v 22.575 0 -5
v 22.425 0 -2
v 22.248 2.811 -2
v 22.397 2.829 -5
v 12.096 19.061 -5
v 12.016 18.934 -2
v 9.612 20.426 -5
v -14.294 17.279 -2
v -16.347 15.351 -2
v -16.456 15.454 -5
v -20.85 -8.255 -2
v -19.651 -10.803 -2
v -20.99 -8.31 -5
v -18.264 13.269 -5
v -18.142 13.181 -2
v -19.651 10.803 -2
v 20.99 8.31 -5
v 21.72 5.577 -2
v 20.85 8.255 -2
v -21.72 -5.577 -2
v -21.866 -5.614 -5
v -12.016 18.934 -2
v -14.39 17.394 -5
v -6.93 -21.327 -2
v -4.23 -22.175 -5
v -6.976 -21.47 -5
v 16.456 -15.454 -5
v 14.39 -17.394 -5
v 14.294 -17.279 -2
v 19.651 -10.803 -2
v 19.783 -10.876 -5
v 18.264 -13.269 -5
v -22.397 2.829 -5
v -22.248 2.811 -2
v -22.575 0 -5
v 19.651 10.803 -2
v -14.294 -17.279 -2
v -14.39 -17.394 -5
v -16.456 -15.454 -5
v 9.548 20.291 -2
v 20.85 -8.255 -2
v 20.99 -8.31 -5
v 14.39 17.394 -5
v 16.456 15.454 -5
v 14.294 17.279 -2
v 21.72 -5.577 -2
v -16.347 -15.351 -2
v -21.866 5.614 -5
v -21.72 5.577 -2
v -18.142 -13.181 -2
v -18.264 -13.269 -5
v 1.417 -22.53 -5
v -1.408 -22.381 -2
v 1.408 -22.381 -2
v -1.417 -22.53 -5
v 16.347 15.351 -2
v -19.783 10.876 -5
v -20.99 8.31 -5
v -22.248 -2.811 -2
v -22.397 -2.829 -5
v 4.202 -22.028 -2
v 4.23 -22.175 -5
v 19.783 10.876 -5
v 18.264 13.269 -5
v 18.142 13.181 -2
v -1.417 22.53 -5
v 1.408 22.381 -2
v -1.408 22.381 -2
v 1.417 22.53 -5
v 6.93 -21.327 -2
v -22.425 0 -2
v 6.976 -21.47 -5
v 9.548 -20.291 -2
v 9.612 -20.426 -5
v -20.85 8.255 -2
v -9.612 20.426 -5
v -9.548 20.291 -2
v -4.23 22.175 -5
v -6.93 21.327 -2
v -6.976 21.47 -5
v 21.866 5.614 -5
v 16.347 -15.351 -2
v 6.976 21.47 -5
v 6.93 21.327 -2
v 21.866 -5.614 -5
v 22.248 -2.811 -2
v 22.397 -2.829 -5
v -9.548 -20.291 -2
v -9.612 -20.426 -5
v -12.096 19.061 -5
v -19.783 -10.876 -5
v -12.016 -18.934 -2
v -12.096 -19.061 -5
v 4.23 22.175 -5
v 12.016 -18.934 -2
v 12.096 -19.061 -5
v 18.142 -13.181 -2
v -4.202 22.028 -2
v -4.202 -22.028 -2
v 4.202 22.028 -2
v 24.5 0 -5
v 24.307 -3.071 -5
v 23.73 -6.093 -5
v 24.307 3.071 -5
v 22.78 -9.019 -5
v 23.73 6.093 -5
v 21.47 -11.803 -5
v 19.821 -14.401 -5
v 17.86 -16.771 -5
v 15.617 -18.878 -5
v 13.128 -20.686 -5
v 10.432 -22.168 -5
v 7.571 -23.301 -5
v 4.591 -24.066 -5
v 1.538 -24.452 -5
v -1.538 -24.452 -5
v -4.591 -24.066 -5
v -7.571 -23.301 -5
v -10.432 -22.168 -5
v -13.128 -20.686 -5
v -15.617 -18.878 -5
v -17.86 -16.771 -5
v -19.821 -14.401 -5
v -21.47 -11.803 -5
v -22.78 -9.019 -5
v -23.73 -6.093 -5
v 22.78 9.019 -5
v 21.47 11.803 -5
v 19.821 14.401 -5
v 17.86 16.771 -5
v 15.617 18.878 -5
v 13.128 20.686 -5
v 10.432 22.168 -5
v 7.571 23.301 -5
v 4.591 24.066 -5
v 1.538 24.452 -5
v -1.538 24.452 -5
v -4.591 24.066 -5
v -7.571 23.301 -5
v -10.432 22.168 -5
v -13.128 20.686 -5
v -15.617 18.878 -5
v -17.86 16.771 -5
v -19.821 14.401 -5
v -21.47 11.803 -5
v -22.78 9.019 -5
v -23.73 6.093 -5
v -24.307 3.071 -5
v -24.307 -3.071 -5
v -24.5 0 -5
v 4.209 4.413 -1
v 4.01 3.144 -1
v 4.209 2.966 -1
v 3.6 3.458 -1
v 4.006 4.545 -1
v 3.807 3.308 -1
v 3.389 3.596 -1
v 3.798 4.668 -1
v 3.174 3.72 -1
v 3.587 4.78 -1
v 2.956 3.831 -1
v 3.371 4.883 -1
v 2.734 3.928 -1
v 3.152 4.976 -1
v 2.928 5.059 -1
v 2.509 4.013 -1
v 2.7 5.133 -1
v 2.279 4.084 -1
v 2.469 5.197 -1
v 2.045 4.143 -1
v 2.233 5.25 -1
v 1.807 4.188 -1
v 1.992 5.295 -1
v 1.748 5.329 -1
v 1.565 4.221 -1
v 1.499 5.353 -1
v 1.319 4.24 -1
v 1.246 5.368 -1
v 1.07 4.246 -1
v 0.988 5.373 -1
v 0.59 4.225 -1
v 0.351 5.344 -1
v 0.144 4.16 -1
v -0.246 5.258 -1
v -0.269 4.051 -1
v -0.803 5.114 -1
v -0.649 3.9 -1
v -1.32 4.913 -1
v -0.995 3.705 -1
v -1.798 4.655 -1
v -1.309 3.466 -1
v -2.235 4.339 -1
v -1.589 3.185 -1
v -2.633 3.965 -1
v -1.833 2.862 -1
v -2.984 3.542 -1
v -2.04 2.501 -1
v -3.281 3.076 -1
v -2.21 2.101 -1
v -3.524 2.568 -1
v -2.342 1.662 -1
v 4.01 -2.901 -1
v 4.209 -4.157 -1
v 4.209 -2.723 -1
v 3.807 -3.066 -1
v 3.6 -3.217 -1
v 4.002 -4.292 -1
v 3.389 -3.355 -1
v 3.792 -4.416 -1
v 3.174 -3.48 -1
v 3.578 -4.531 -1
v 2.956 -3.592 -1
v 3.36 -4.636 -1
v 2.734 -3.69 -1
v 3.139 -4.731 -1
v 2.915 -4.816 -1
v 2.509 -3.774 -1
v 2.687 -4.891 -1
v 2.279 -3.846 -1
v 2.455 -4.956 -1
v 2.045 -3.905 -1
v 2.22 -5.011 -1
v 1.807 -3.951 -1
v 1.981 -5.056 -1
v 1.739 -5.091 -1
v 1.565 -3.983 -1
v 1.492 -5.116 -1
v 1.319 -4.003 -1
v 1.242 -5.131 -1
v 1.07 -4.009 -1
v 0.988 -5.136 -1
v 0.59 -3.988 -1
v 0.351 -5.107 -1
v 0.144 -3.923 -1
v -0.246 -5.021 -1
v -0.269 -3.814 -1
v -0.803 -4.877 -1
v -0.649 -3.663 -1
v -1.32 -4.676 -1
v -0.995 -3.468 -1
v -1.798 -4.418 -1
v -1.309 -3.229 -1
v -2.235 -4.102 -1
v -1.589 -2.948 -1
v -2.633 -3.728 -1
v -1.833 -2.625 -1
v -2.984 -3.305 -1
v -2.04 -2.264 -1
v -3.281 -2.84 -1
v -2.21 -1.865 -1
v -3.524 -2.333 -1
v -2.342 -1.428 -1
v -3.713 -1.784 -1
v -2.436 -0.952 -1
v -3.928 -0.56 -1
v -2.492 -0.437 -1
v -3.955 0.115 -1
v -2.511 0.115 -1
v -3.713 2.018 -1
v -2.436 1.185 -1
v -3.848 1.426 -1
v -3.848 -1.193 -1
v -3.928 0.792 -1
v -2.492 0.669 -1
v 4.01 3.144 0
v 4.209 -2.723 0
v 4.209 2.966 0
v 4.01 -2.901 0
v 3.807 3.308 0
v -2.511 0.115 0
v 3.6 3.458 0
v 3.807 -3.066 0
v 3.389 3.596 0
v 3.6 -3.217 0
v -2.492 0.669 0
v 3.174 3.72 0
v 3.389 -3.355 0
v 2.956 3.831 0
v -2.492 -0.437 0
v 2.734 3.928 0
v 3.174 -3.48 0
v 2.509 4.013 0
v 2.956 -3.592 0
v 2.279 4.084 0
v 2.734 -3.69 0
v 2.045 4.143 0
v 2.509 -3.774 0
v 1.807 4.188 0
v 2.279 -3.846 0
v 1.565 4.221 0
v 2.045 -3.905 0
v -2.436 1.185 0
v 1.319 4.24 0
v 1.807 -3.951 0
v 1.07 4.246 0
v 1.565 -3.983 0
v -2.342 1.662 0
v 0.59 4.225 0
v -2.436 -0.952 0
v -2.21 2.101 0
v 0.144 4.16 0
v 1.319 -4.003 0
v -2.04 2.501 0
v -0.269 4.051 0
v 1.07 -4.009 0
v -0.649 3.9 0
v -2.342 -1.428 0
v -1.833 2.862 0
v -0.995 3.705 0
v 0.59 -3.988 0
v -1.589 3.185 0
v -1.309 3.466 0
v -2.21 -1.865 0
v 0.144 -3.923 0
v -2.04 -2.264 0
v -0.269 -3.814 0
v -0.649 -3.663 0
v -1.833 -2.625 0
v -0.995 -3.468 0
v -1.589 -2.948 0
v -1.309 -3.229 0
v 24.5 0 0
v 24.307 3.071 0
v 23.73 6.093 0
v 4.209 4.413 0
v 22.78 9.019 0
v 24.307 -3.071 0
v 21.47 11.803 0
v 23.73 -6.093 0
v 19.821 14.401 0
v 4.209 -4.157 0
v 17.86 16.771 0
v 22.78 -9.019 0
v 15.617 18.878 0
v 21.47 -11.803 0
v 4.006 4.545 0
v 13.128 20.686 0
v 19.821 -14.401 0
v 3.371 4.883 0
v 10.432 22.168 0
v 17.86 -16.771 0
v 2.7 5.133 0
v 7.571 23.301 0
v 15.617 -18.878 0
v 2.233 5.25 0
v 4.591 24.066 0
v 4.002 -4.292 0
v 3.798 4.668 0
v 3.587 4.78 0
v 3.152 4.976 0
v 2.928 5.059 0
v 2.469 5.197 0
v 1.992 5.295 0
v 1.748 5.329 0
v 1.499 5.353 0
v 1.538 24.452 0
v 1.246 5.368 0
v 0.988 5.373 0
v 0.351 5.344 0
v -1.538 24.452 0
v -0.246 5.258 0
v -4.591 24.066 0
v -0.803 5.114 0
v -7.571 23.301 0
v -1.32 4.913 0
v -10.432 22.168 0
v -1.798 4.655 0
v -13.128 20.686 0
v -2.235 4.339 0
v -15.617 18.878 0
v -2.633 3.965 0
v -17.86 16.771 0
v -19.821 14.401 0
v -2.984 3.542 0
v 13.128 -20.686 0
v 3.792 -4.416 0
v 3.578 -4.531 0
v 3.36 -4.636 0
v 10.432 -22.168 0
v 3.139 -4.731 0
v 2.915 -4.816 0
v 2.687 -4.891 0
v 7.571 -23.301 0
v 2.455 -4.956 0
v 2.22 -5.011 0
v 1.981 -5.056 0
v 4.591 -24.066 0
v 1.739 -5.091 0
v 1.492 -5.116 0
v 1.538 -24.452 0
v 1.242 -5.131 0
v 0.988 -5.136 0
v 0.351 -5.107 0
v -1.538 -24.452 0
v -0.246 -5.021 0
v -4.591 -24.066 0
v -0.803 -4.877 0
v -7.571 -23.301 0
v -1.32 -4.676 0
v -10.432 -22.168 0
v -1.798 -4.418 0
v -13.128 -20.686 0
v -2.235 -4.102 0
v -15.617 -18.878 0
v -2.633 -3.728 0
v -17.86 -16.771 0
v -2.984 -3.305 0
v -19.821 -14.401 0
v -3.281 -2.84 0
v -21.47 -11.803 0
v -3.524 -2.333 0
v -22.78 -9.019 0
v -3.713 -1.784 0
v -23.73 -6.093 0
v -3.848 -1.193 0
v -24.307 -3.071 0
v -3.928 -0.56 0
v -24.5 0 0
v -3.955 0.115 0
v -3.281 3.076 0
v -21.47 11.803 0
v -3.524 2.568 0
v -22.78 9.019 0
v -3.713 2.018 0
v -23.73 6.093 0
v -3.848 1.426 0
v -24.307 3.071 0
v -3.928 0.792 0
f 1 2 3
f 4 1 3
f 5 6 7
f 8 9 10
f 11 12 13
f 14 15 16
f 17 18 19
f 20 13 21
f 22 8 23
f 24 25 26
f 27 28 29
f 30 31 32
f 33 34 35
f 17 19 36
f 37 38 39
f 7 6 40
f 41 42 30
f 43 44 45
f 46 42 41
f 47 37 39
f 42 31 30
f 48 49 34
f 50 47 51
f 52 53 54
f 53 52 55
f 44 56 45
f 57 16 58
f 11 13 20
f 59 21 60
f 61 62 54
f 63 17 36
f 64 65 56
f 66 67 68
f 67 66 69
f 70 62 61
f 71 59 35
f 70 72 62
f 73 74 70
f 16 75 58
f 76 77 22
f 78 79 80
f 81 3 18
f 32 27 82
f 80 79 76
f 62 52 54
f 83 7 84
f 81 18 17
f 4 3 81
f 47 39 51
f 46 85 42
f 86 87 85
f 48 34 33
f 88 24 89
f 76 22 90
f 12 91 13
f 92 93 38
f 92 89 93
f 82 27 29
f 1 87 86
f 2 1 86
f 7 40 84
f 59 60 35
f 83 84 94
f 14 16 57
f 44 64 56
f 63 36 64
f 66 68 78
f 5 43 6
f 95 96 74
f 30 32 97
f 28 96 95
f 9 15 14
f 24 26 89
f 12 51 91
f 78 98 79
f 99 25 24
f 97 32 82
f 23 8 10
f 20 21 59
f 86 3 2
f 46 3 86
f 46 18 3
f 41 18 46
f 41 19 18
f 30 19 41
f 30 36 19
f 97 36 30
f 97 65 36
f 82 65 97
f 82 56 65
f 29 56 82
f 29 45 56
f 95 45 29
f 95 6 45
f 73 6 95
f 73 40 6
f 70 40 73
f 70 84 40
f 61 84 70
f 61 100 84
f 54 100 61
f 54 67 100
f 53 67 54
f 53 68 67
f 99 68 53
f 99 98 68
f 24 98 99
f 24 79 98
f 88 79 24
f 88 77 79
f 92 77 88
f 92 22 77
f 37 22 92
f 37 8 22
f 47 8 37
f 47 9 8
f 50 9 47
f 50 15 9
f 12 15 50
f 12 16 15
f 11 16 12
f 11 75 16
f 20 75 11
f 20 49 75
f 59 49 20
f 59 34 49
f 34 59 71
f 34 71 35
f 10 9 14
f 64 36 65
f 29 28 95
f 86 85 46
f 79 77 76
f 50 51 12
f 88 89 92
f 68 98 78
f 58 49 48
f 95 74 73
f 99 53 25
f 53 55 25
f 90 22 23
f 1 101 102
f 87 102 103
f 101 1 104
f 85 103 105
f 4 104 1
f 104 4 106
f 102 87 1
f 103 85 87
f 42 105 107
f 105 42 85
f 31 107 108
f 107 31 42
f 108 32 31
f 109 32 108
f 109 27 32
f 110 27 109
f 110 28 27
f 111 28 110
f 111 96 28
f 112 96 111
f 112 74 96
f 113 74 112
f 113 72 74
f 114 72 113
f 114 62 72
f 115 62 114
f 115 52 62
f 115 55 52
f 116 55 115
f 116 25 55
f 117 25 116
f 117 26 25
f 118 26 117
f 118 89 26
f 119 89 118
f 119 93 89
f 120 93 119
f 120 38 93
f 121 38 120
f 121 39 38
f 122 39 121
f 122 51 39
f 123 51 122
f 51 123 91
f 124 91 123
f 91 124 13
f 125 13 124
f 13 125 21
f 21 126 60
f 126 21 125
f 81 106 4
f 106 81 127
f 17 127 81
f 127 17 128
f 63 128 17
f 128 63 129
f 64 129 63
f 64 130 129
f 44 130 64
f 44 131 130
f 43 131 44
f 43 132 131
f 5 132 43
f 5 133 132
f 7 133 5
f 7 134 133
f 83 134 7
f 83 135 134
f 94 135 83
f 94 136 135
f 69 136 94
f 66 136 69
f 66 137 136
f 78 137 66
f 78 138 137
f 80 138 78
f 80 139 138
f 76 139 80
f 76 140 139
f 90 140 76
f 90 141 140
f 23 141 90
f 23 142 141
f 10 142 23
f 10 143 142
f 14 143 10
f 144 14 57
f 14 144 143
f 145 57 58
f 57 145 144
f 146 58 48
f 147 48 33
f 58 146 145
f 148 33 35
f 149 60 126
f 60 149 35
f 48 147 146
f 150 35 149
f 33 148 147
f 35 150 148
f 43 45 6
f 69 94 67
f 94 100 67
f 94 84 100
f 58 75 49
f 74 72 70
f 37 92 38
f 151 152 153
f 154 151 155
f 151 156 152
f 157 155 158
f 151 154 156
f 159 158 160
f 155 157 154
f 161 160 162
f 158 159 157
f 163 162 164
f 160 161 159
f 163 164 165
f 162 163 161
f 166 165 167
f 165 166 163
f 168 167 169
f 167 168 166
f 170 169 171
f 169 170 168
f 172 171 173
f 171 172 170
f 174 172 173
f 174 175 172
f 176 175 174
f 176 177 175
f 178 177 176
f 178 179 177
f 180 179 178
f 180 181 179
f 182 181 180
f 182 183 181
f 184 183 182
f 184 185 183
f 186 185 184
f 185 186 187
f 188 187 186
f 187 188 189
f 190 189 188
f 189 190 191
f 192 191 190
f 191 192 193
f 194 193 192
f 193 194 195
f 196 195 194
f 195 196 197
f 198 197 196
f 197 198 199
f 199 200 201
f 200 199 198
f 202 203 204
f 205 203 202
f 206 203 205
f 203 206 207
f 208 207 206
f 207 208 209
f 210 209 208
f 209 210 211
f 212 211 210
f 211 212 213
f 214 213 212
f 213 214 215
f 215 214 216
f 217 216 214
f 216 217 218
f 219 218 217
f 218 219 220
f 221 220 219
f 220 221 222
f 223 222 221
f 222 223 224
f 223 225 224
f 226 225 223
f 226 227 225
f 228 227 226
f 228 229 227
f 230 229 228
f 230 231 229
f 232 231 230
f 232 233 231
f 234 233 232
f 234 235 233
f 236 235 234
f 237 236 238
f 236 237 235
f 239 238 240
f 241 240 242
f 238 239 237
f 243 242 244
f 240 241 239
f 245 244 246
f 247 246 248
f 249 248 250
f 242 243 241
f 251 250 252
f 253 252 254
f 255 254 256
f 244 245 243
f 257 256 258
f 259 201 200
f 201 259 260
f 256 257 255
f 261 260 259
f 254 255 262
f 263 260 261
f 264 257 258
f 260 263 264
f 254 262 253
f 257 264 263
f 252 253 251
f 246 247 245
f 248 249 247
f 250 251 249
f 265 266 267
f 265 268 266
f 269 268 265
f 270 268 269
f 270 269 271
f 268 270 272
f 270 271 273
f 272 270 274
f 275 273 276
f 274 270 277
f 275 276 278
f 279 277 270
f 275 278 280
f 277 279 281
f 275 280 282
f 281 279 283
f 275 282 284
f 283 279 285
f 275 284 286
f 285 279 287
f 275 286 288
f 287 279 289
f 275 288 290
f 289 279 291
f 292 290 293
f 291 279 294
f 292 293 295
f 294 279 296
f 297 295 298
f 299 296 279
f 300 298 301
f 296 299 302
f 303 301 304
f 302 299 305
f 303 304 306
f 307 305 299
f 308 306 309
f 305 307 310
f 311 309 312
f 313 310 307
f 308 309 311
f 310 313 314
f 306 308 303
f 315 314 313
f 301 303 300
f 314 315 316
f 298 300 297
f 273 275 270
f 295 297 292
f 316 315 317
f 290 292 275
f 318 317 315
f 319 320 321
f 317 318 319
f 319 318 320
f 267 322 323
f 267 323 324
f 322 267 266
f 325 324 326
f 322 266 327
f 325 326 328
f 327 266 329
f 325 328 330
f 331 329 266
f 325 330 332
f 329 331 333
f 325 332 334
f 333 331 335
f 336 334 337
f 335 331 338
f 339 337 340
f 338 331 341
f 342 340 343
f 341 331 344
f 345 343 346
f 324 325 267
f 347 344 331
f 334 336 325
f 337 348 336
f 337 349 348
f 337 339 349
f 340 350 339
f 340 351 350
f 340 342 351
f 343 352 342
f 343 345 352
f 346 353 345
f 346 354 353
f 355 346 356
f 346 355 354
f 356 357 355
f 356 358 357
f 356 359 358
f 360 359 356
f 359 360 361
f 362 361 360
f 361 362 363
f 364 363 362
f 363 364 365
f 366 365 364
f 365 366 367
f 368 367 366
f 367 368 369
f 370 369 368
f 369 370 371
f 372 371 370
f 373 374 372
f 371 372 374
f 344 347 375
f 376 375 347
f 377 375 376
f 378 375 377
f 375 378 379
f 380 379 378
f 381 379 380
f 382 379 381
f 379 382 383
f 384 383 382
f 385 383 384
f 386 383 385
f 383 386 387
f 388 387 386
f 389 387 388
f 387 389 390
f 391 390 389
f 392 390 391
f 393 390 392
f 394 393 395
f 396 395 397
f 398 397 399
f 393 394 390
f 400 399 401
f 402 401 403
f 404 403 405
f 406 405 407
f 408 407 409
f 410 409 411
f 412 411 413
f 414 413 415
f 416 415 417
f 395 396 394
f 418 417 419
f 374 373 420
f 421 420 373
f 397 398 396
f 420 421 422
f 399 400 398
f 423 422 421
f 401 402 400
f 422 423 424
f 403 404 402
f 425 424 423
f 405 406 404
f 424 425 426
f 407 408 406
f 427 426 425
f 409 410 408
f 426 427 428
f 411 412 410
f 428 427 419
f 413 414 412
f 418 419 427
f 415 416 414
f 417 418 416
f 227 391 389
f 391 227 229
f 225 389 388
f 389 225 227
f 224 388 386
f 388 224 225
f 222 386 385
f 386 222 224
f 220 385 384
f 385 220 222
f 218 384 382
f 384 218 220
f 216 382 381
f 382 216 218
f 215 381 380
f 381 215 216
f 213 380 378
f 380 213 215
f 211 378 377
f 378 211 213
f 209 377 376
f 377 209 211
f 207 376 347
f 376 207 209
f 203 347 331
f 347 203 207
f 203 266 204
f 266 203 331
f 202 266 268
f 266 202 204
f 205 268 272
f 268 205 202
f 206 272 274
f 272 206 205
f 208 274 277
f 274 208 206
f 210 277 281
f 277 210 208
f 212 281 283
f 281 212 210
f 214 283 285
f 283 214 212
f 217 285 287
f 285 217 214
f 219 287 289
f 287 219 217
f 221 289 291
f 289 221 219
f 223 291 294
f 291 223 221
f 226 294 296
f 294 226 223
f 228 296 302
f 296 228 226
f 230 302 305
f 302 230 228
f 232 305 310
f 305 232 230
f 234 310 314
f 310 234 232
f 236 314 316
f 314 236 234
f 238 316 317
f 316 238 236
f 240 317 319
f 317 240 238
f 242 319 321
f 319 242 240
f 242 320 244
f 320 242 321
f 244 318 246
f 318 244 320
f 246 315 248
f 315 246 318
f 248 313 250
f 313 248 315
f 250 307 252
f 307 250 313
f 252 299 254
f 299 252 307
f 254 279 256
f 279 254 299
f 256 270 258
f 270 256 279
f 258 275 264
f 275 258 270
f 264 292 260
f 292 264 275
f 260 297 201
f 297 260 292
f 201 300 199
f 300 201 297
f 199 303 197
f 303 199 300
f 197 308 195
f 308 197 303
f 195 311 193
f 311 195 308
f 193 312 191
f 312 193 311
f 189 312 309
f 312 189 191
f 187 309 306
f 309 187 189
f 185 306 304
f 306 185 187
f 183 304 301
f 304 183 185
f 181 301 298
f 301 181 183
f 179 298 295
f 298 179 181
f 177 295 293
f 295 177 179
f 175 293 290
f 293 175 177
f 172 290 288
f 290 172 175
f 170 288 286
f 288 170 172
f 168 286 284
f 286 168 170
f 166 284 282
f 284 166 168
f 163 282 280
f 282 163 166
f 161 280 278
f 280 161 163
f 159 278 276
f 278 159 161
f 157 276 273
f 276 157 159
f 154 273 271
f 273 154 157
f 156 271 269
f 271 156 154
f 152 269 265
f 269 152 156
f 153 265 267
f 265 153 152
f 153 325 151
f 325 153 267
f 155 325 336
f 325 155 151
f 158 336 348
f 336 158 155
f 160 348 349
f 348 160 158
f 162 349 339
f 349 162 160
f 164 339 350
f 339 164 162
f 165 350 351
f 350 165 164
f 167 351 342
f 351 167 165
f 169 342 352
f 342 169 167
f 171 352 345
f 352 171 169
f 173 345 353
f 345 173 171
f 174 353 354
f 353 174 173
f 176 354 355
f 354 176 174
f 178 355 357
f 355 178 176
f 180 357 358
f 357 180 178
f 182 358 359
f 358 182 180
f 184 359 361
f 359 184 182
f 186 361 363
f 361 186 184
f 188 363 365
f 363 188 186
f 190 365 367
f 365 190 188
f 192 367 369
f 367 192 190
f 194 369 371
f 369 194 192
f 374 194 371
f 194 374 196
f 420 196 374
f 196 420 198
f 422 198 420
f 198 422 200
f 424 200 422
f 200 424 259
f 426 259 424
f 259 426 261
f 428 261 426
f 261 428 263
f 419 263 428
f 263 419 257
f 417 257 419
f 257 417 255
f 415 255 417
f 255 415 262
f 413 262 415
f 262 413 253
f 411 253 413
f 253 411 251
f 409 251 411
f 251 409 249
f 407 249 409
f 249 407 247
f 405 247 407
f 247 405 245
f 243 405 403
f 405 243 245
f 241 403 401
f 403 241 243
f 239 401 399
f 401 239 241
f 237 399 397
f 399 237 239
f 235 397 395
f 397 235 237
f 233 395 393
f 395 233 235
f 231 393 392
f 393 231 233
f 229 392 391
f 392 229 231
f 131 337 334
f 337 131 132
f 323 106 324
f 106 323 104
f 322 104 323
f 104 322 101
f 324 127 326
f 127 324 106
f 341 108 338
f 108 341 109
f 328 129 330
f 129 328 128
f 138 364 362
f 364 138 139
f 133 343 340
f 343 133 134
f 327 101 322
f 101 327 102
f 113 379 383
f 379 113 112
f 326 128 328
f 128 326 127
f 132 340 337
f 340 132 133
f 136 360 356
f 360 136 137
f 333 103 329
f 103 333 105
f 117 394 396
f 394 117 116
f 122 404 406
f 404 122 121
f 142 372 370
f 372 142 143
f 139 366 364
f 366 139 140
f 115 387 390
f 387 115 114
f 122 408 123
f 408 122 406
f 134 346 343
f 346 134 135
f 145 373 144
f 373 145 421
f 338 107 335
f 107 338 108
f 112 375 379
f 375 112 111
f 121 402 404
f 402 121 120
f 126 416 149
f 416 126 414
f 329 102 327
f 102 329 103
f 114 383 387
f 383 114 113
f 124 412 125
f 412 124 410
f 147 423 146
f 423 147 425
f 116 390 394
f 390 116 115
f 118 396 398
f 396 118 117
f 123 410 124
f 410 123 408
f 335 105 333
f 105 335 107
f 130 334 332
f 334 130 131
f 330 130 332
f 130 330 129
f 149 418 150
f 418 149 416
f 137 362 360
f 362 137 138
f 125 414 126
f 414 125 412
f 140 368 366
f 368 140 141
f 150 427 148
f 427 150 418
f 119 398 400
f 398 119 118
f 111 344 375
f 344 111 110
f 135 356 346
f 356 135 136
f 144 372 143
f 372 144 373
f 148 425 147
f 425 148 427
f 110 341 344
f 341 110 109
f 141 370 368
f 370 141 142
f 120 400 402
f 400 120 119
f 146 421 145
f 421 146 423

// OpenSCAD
$fn = 50;


difference() {
	union() {
		translate(v = [0, 0, -5.0000000000]) {
			cylinder(h = 5, r = 24.5000000000);
		}
	}
	union() {
		#translate(v = [0, 0, -5.0000000000]) {
			cylinder(h = 3, r1 = 22.5750000000, r2 = 22.4250000000);
		}
		translate(v = [0, 0, -1]) {
			linear_extrude(height = 1) {
				text(font = "Impact", halign = "center", size = 10, text = "C", valign = "center");
			}
		}
	}
}
